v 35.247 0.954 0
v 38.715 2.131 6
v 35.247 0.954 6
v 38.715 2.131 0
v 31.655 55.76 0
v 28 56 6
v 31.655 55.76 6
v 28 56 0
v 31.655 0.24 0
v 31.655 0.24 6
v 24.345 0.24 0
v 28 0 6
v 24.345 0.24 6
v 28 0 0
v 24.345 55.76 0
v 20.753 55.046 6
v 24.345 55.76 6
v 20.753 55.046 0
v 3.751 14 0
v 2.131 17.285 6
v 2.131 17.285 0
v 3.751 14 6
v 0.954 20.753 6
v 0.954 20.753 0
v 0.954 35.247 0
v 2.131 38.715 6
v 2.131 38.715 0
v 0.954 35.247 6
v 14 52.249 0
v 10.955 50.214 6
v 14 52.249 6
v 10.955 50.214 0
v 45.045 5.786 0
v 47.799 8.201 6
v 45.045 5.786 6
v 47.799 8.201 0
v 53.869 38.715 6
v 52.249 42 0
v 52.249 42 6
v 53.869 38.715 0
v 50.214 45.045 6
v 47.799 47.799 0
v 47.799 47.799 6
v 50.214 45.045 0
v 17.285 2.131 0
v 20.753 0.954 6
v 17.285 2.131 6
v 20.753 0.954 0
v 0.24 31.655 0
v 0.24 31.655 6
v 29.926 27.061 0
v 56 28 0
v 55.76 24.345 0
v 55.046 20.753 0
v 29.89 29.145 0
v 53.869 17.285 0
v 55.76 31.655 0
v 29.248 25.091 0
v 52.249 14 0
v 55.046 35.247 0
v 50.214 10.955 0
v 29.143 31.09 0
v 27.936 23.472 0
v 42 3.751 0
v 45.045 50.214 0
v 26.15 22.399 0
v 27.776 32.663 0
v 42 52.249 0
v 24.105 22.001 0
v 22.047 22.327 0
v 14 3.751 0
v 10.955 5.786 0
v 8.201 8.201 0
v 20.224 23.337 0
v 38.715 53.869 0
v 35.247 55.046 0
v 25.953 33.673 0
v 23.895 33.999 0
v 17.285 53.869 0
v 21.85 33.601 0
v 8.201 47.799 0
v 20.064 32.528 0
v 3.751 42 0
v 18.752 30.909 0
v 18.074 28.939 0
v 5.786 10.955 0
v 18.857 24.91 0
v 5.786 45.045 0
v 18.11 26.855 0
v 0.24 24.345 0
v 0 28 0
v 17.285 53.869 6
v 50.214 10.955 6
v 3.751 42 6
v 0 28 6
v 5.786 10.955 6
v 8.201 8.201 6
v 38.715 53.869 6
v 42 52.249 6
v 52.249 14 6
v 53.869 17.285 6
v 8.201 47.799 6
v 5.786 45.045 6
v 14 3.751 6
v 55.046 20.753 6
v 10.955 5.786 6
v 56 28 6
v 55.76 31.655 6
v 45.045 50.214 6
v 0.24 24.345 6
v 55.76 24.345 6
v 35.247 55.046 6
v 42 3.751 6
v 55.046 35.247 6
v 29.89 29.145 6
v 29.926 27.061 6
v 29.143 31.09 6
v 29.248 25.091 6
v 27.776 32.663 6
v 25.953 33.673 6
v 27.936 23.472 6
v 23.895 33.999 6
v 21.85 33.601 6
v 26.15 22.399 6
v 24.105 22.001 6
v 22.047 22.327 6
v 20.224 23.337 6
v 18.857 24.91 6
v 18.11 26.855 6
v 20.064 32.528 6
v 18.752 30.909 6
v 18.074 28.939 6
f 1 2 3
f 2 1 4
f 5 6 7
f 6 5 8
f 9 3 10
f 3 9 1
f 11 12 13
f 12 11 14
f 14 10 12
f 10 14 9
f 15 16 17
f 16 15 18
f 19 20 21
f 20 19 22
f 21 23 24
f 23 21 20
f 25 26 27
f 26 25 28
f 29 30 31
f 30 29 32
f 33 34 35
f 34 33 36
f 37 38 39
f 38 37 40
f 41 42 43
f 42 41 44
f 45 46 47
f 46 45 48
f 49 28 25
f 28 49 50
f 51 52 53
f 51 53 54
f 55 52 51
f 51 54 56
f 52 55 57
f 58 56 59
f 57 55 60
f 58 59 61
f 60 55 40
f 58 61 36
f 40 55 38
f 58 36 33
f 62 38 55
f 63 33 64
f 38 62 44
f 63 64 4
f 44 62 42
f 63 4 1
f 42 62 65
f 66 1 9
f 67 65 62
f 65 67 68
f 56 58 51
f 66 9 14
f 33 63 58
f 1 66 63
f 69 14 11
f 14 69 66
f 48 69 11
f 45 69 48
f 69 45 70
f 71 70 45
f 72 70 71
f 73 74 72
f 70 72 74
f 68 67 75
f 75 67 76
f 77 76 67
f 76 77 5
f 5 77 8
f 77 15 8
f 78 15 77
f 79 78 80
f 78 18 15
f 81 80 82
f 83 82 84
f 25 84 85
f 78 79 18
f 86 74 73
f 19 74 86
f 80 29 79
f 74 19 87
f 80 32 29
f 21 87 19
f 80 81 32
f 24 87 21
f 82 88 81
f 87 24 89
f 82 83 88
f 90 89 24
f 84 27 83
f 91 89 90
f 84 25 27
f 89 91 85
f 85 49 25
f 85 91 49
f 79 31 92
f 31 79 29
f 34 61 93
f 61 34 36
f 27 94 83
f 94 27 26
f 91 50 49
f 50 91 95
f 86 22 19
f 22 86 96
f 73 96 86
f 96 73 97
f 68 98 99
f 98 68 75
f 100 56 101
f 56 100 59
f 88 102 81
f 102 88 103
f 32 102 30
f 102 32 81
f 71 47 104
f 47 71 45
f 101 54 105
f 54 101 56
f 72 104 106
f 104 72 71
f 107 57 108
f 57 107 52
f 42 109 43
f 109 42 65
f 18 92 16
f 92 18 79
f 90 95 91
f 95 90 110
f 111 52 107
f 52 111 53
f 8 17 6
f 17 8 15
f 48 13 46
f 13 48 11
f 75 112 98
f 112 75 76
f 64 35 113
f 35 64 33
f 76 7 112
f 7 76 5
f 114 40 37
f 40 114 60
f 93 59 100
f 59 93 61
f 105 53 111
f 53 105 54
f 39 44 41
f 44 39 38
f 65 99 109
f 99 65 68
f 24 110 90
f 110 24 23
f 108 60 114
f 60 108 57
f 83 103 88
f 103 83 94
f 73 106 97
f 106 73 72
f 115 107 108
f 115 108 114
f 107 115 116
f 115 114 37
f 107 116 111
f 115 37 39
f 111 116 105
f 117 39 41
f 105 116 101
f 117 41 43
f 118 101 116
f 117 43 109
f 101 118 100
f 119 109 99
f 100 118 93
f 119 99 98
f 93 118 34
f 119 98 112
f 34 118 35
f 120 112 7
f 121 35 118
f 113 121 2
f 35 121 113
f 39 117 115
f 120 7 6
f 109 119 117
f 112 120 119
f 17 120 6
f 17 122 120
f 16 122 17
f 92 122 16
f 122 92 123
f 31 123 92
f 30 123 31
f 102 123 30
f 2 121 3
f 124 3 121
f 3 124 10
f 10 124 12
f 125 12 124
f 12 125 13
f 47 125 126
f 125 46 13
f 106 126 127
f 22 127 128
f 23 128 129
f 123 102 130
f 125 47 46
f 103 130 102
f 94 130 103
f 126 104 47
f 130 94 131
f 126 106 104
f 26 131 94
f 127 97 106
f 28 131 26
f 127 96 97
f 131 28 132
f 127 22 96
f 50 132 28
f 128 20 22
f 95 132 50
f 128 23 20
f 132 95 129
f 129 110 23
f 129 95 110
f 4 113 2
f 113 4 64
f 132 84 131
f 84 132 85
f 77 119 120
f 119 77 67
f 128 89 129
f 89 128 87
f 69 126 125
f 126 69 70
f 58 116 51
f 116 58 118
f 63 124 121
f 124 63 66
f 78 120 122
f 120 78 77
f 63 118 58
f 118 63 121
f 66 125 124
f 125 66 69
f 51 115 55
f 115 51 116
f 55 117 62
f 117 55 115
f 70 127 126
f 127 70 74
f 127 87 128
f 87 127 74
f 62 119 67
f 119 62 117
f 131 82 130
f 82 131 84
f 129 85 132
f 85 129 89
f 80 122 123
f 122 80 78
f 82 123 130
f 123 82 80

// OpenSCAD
$fn = 32;

// ----------------------------------------------------------------------
// Cam plate: eccentric cam, base R28
// ----------------------------------------------------------------------

// --- parameters (mm) ---
base_r = 28;              // base circle radius
lobe_h = 14;              // cam lobe rise
bore_r = 6;               // shaft bore radius
plate_t = 6;              // plate thickness, Z (extrusion height)
ecc = 4;                  // disc eccentricity

profile = [[56, 28], [55.76, 31.655], [55.046, 35.247], [53.869, 38.715], [52.249, 42], [50.214, 45.045], [47.799, 47.799], [45.045, 50.214], [42, 52.249], [38.715, 53.869], [35.247, 55.046], [31.655, 55.76], [28, 56], [24.345, 55.76], [20.753, 55.046], [17.285, 53.869], [14, 52.249], [10.955, 50.214], [8.201, 47.799], [5.786, 45.045], [3.751, 42], [2.131, 38.715], [0.954, 35.247], [0.24, 31.655], [0, 28], [0.24, 24.345], [0.954, 20.753], [2.131, 17.285], [3.751, 14], [5.786, 10.955], [8.201, 8.201], [10.955, 5.786], [14, 3.751], [17.285, 2.131], [20.753, 0.954], [24.345, 0.24], [28, 0], [31.655, 0.24], [35.247, 0.954], [38.715, 2.131], [42, 3.751], [45.045, 5.786], [47.799, 8.201], [50.214, 10.955], [52.249, 14], [53.869, 17.285], [55.046, 20.753], [55.76, 24.345]];  // primary outline, 48 points, counter clockwise
void_1 = [[29.89, 29.145], [29.143, 31.09], [27.776, 32.663], [25.953, 33.673], [23.895, 33.999], [21.85, 33.601], [20.064, 32.528], [18.752, 30.909], [18.074, 28.939], [18.11, 26.855], [18.857, 24.91], [20.224, 23.337], [22.047, 22.327], [24.105, 22.001], [26.15, 22.399], [27.936, 23.472], [29.248, 25.091], [29.926, 27.061]];  // shaft bore, 18 points

// --- the one profile operation ---
difference() {
  linear_extrude(height = plate_t) polygon(points = profile);
  translate([0, 0, -1])
    linear_extrude(height = plate_t + 2) polygon(points = void_1);
}
